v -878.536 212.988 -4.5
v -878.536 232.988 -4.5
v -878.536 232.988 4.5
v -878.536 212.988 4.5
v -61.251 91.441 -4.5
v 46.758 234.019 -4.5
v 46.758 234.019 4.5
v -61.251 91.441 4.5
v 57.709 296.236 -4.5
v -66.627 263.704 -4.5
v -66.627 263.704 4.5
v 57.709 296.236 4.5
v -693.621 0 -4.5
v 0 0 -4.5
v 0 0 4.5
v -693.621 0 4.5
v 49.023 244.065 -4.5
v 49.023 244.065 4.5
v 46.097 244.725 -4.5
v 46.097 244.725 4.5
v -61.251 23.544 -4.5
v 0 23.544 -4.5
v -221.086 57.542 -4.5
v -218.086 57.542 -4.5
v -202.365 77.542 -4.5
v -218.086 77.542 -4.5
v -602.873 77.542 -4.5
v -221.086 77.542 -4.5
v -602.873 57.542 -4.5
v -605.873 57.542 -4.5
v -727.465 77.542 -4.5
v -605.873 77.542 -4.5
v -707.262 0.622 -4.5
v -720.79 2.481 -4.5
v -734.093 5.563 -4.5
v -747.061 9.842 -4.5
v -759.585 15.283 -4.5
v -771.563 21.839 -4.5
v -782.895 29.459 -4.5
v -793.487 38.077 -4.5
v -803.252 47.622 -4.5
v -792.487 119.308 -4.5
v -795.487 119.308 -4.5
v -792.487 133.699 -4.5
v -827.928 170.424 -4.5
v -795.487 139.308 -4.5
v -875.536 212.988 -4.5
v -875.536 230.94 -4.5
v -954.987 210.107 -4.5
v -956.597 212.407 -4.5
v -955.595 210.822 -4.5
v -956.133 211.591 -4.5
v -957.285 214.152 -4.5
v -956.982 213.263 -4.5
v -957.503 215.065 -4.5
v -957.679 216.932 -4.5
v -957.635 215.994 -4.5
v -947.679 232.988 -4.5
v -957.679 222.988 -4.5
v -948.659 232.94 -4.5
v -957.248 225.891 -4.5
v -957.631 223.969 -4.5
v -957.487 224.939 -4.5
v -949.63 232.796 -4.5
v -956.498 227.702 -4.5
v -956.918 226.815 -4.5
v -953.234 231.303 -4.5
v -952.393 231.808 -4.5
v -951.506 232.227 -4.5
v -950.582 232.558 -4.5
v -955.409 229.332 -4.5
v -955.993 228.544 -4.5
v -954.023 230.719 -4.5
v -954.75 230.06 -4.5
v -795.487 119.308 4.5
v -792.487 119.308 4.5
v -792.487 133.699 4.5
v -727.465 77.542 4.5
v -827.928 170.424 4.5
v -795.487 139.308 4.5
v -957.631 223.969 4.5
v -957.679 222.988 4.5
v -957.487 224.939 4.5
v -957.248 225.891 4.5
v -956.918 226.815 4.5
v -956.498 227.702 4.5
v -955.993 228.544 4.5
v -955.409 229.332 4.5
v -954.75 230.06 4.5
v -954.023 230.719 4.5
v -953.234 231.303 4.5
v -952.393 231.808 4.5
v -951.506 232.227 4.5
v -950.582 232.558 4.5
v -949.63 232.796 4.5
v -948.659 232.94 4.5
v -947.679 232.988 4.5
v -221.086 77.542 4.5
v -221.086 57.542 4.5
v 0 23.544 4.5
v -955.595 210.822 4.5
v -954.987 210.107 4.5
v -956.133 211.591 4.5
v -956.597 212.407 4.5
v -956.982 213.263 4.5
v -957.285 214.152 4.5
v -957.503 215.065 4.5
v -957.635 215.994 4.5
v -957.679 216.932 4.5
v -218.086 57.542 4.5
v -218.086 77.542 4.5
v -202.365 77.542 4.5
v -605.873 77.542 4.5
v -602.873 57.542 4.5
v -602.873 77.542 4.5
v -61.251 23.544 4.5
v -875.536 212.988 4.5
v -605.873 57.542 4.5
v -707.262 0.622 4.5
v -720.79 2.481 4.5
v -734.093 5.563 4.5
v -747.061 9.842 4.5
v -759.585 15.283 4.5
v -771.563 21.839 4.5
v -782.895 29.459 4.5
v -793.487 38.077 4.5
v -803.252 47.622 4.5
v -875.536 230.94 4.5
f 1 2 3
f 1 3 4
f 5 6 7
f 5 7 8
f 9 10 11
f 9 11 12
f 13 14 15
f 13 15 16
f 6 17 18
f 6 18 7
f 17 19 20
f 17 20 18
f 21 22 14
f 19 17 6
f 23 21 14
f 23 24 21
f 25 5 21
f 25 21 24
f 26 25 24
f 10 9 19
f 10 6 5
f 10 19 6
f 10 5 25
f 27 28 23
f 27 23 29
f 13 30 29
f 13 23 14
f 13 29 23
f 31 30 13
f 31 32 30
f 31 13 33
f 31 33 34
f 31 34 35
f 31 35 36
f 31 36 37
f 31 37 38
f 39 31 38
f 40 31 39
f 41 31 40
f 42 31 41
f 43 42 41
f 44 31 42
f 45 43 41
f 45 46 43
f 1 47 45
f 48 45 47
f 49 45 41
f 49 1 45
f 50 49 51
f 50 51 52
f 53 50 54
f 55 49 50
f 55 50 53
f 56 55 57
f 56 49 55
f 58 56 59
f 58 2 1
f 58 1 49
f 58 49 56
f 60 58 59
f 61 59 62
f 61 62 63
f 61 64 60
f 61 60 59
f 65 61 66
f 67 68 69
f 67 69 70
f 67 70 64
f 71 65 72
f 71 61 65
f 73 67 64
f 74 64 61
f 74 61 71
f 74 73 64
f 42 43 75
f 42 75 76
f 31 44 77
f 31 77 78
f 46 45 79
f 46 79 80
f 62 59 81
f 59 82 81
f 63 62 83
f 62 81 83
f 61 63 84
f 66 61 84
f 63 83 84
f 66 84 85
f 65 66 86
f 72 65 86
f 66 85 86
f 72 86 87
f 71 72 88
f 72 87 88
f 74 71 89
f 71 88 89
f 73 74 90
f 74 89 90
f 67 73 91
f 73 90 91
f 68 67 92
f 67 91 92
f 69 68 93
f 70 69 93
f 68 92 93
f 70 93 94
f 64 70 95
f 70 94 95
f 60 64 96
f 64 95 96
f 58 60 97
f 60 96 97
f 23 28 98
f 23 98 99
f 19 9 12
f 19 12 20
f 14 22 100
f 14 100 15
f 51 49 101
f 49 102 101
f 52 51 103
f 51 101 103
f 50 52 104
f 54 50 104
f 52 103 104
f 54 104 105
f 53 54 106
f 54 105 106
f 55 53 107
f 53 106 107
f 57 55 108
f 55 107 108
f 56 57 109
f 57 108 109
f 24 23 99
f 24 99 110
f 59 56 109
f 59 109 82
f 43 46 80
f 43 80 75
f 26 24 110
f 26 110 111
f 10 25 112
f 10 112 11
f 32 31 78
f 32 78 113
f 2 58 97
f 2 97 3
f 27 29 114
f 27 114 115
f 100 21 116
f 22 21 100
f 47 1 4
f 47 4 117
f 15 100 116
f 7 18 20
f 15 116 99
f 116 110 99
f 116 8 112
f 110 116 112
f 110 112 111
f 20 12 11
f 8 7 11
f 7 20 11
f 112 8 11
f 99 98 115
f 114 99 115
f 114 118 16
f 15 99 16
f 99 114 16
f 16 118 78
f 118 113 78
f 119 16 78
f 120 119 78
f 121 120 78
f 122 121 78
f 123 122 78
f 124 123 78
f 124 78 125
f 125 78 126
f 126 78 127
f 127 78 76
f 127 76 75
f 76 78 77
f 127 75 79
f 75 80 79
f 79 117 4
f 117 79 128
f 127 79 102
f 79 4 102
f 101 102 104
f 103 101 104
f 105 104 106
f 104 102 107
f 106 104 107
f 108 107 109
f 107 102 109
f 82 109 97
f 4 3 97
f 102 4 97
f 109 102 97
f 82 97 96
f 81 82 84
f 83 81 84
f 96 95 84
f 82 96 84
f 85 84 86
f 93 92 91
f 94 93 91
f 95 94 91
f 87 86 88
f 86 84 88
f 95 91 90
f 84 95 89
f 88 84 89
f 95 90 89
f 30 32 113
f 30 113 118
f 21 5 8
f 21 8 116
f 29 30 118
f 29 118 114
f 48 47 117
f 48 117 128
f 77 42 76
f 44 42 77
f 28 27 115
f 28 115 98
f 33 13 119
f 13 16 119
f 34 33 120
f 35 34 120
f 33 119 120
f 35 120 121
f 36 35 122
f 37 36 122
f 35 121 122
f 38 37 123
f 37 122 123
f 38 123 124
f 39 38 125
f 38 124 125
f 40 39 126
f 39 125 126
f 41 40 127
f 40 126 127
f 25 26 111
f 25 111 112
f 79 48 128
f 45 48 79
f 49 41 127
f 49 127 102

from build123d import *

# Parameters (mm, degrees)
BOSS_EXTRU_5_DEPTH      = 4.5
BOSS_EXTRU_5_DEPTH_BACK = 4.5
CONG_1_R                = 150
CONG_2_R                = 10


with BuildPart() as part:
    # Esquisse1 → Boss.-Extru.5 (new, two sides: drawn at the far end of the back side and taken through both)
    with BuildSketch(Plane.XY.offset(-BOSS_EXTRU_5_DEPTH_BACK)):
        Polygon((0, 0), (-758.779695033, 0), (-957.678777511, 212.988479036), (-957.678777511, 232.988479036), (-878.536330397, 232.988479036), (-878.536330397, 212.988479036), (-875.536330397, 212.988479036), (-875.536330397, 230.940110876), (-827.928204377, 170.423574705), (-795.486560581, 139.307598786), (-795.486560581, 119.307598786), (-792.486560581, 119.307598786), (-792.486560581, 133.699221334), (-727.464635299, 77.5420493), (-605.872801012, 77.5420493), (-605.872801012, 57.5420493), (-602.872801012, 57.5420493), (-602.872801012, 77.5420493), (-221.085552101, 77.5420493), (-221.085552101, 57.5420493), (-218.085552101, 57.5420493), (-218.085552101, 77.5420493), (-202.36477071, 77.5420493), (-66.626684698, 263.704257097), (57.709039867, 296.235629936), (46.096581547, 244.724780595), (49.02313659, 244.06502641), (46.758497819, 234.019481935), (-61.251050758, 91.440931648), (-61.251050758, 23.544195216), (0, 23.544195216), align=None)
    extrude(amount=BOSS_EXTRU_5_DEPTH + BOSS_EXTRU_5_DEPTH_BACK)

    # Cong_1
    cong_1_edges = [part.edges().sort_by_distance(p)[0] for p in [
        (-758.779695033, 0, 0),
    ]]
    fillet(cong_1_edges, radius=CONG_1_R)

    # Cong_2
    cong_2_edges = [part.edges().sort_by_distance(p)[0] for p in [
        (-957.678777511, 212.988479036, 0),
        (-957.678777511, 232.988479036, 0),
    ]]
    fillet(cong_2_edges, radius=CONG_2_R)


solid = part.part
